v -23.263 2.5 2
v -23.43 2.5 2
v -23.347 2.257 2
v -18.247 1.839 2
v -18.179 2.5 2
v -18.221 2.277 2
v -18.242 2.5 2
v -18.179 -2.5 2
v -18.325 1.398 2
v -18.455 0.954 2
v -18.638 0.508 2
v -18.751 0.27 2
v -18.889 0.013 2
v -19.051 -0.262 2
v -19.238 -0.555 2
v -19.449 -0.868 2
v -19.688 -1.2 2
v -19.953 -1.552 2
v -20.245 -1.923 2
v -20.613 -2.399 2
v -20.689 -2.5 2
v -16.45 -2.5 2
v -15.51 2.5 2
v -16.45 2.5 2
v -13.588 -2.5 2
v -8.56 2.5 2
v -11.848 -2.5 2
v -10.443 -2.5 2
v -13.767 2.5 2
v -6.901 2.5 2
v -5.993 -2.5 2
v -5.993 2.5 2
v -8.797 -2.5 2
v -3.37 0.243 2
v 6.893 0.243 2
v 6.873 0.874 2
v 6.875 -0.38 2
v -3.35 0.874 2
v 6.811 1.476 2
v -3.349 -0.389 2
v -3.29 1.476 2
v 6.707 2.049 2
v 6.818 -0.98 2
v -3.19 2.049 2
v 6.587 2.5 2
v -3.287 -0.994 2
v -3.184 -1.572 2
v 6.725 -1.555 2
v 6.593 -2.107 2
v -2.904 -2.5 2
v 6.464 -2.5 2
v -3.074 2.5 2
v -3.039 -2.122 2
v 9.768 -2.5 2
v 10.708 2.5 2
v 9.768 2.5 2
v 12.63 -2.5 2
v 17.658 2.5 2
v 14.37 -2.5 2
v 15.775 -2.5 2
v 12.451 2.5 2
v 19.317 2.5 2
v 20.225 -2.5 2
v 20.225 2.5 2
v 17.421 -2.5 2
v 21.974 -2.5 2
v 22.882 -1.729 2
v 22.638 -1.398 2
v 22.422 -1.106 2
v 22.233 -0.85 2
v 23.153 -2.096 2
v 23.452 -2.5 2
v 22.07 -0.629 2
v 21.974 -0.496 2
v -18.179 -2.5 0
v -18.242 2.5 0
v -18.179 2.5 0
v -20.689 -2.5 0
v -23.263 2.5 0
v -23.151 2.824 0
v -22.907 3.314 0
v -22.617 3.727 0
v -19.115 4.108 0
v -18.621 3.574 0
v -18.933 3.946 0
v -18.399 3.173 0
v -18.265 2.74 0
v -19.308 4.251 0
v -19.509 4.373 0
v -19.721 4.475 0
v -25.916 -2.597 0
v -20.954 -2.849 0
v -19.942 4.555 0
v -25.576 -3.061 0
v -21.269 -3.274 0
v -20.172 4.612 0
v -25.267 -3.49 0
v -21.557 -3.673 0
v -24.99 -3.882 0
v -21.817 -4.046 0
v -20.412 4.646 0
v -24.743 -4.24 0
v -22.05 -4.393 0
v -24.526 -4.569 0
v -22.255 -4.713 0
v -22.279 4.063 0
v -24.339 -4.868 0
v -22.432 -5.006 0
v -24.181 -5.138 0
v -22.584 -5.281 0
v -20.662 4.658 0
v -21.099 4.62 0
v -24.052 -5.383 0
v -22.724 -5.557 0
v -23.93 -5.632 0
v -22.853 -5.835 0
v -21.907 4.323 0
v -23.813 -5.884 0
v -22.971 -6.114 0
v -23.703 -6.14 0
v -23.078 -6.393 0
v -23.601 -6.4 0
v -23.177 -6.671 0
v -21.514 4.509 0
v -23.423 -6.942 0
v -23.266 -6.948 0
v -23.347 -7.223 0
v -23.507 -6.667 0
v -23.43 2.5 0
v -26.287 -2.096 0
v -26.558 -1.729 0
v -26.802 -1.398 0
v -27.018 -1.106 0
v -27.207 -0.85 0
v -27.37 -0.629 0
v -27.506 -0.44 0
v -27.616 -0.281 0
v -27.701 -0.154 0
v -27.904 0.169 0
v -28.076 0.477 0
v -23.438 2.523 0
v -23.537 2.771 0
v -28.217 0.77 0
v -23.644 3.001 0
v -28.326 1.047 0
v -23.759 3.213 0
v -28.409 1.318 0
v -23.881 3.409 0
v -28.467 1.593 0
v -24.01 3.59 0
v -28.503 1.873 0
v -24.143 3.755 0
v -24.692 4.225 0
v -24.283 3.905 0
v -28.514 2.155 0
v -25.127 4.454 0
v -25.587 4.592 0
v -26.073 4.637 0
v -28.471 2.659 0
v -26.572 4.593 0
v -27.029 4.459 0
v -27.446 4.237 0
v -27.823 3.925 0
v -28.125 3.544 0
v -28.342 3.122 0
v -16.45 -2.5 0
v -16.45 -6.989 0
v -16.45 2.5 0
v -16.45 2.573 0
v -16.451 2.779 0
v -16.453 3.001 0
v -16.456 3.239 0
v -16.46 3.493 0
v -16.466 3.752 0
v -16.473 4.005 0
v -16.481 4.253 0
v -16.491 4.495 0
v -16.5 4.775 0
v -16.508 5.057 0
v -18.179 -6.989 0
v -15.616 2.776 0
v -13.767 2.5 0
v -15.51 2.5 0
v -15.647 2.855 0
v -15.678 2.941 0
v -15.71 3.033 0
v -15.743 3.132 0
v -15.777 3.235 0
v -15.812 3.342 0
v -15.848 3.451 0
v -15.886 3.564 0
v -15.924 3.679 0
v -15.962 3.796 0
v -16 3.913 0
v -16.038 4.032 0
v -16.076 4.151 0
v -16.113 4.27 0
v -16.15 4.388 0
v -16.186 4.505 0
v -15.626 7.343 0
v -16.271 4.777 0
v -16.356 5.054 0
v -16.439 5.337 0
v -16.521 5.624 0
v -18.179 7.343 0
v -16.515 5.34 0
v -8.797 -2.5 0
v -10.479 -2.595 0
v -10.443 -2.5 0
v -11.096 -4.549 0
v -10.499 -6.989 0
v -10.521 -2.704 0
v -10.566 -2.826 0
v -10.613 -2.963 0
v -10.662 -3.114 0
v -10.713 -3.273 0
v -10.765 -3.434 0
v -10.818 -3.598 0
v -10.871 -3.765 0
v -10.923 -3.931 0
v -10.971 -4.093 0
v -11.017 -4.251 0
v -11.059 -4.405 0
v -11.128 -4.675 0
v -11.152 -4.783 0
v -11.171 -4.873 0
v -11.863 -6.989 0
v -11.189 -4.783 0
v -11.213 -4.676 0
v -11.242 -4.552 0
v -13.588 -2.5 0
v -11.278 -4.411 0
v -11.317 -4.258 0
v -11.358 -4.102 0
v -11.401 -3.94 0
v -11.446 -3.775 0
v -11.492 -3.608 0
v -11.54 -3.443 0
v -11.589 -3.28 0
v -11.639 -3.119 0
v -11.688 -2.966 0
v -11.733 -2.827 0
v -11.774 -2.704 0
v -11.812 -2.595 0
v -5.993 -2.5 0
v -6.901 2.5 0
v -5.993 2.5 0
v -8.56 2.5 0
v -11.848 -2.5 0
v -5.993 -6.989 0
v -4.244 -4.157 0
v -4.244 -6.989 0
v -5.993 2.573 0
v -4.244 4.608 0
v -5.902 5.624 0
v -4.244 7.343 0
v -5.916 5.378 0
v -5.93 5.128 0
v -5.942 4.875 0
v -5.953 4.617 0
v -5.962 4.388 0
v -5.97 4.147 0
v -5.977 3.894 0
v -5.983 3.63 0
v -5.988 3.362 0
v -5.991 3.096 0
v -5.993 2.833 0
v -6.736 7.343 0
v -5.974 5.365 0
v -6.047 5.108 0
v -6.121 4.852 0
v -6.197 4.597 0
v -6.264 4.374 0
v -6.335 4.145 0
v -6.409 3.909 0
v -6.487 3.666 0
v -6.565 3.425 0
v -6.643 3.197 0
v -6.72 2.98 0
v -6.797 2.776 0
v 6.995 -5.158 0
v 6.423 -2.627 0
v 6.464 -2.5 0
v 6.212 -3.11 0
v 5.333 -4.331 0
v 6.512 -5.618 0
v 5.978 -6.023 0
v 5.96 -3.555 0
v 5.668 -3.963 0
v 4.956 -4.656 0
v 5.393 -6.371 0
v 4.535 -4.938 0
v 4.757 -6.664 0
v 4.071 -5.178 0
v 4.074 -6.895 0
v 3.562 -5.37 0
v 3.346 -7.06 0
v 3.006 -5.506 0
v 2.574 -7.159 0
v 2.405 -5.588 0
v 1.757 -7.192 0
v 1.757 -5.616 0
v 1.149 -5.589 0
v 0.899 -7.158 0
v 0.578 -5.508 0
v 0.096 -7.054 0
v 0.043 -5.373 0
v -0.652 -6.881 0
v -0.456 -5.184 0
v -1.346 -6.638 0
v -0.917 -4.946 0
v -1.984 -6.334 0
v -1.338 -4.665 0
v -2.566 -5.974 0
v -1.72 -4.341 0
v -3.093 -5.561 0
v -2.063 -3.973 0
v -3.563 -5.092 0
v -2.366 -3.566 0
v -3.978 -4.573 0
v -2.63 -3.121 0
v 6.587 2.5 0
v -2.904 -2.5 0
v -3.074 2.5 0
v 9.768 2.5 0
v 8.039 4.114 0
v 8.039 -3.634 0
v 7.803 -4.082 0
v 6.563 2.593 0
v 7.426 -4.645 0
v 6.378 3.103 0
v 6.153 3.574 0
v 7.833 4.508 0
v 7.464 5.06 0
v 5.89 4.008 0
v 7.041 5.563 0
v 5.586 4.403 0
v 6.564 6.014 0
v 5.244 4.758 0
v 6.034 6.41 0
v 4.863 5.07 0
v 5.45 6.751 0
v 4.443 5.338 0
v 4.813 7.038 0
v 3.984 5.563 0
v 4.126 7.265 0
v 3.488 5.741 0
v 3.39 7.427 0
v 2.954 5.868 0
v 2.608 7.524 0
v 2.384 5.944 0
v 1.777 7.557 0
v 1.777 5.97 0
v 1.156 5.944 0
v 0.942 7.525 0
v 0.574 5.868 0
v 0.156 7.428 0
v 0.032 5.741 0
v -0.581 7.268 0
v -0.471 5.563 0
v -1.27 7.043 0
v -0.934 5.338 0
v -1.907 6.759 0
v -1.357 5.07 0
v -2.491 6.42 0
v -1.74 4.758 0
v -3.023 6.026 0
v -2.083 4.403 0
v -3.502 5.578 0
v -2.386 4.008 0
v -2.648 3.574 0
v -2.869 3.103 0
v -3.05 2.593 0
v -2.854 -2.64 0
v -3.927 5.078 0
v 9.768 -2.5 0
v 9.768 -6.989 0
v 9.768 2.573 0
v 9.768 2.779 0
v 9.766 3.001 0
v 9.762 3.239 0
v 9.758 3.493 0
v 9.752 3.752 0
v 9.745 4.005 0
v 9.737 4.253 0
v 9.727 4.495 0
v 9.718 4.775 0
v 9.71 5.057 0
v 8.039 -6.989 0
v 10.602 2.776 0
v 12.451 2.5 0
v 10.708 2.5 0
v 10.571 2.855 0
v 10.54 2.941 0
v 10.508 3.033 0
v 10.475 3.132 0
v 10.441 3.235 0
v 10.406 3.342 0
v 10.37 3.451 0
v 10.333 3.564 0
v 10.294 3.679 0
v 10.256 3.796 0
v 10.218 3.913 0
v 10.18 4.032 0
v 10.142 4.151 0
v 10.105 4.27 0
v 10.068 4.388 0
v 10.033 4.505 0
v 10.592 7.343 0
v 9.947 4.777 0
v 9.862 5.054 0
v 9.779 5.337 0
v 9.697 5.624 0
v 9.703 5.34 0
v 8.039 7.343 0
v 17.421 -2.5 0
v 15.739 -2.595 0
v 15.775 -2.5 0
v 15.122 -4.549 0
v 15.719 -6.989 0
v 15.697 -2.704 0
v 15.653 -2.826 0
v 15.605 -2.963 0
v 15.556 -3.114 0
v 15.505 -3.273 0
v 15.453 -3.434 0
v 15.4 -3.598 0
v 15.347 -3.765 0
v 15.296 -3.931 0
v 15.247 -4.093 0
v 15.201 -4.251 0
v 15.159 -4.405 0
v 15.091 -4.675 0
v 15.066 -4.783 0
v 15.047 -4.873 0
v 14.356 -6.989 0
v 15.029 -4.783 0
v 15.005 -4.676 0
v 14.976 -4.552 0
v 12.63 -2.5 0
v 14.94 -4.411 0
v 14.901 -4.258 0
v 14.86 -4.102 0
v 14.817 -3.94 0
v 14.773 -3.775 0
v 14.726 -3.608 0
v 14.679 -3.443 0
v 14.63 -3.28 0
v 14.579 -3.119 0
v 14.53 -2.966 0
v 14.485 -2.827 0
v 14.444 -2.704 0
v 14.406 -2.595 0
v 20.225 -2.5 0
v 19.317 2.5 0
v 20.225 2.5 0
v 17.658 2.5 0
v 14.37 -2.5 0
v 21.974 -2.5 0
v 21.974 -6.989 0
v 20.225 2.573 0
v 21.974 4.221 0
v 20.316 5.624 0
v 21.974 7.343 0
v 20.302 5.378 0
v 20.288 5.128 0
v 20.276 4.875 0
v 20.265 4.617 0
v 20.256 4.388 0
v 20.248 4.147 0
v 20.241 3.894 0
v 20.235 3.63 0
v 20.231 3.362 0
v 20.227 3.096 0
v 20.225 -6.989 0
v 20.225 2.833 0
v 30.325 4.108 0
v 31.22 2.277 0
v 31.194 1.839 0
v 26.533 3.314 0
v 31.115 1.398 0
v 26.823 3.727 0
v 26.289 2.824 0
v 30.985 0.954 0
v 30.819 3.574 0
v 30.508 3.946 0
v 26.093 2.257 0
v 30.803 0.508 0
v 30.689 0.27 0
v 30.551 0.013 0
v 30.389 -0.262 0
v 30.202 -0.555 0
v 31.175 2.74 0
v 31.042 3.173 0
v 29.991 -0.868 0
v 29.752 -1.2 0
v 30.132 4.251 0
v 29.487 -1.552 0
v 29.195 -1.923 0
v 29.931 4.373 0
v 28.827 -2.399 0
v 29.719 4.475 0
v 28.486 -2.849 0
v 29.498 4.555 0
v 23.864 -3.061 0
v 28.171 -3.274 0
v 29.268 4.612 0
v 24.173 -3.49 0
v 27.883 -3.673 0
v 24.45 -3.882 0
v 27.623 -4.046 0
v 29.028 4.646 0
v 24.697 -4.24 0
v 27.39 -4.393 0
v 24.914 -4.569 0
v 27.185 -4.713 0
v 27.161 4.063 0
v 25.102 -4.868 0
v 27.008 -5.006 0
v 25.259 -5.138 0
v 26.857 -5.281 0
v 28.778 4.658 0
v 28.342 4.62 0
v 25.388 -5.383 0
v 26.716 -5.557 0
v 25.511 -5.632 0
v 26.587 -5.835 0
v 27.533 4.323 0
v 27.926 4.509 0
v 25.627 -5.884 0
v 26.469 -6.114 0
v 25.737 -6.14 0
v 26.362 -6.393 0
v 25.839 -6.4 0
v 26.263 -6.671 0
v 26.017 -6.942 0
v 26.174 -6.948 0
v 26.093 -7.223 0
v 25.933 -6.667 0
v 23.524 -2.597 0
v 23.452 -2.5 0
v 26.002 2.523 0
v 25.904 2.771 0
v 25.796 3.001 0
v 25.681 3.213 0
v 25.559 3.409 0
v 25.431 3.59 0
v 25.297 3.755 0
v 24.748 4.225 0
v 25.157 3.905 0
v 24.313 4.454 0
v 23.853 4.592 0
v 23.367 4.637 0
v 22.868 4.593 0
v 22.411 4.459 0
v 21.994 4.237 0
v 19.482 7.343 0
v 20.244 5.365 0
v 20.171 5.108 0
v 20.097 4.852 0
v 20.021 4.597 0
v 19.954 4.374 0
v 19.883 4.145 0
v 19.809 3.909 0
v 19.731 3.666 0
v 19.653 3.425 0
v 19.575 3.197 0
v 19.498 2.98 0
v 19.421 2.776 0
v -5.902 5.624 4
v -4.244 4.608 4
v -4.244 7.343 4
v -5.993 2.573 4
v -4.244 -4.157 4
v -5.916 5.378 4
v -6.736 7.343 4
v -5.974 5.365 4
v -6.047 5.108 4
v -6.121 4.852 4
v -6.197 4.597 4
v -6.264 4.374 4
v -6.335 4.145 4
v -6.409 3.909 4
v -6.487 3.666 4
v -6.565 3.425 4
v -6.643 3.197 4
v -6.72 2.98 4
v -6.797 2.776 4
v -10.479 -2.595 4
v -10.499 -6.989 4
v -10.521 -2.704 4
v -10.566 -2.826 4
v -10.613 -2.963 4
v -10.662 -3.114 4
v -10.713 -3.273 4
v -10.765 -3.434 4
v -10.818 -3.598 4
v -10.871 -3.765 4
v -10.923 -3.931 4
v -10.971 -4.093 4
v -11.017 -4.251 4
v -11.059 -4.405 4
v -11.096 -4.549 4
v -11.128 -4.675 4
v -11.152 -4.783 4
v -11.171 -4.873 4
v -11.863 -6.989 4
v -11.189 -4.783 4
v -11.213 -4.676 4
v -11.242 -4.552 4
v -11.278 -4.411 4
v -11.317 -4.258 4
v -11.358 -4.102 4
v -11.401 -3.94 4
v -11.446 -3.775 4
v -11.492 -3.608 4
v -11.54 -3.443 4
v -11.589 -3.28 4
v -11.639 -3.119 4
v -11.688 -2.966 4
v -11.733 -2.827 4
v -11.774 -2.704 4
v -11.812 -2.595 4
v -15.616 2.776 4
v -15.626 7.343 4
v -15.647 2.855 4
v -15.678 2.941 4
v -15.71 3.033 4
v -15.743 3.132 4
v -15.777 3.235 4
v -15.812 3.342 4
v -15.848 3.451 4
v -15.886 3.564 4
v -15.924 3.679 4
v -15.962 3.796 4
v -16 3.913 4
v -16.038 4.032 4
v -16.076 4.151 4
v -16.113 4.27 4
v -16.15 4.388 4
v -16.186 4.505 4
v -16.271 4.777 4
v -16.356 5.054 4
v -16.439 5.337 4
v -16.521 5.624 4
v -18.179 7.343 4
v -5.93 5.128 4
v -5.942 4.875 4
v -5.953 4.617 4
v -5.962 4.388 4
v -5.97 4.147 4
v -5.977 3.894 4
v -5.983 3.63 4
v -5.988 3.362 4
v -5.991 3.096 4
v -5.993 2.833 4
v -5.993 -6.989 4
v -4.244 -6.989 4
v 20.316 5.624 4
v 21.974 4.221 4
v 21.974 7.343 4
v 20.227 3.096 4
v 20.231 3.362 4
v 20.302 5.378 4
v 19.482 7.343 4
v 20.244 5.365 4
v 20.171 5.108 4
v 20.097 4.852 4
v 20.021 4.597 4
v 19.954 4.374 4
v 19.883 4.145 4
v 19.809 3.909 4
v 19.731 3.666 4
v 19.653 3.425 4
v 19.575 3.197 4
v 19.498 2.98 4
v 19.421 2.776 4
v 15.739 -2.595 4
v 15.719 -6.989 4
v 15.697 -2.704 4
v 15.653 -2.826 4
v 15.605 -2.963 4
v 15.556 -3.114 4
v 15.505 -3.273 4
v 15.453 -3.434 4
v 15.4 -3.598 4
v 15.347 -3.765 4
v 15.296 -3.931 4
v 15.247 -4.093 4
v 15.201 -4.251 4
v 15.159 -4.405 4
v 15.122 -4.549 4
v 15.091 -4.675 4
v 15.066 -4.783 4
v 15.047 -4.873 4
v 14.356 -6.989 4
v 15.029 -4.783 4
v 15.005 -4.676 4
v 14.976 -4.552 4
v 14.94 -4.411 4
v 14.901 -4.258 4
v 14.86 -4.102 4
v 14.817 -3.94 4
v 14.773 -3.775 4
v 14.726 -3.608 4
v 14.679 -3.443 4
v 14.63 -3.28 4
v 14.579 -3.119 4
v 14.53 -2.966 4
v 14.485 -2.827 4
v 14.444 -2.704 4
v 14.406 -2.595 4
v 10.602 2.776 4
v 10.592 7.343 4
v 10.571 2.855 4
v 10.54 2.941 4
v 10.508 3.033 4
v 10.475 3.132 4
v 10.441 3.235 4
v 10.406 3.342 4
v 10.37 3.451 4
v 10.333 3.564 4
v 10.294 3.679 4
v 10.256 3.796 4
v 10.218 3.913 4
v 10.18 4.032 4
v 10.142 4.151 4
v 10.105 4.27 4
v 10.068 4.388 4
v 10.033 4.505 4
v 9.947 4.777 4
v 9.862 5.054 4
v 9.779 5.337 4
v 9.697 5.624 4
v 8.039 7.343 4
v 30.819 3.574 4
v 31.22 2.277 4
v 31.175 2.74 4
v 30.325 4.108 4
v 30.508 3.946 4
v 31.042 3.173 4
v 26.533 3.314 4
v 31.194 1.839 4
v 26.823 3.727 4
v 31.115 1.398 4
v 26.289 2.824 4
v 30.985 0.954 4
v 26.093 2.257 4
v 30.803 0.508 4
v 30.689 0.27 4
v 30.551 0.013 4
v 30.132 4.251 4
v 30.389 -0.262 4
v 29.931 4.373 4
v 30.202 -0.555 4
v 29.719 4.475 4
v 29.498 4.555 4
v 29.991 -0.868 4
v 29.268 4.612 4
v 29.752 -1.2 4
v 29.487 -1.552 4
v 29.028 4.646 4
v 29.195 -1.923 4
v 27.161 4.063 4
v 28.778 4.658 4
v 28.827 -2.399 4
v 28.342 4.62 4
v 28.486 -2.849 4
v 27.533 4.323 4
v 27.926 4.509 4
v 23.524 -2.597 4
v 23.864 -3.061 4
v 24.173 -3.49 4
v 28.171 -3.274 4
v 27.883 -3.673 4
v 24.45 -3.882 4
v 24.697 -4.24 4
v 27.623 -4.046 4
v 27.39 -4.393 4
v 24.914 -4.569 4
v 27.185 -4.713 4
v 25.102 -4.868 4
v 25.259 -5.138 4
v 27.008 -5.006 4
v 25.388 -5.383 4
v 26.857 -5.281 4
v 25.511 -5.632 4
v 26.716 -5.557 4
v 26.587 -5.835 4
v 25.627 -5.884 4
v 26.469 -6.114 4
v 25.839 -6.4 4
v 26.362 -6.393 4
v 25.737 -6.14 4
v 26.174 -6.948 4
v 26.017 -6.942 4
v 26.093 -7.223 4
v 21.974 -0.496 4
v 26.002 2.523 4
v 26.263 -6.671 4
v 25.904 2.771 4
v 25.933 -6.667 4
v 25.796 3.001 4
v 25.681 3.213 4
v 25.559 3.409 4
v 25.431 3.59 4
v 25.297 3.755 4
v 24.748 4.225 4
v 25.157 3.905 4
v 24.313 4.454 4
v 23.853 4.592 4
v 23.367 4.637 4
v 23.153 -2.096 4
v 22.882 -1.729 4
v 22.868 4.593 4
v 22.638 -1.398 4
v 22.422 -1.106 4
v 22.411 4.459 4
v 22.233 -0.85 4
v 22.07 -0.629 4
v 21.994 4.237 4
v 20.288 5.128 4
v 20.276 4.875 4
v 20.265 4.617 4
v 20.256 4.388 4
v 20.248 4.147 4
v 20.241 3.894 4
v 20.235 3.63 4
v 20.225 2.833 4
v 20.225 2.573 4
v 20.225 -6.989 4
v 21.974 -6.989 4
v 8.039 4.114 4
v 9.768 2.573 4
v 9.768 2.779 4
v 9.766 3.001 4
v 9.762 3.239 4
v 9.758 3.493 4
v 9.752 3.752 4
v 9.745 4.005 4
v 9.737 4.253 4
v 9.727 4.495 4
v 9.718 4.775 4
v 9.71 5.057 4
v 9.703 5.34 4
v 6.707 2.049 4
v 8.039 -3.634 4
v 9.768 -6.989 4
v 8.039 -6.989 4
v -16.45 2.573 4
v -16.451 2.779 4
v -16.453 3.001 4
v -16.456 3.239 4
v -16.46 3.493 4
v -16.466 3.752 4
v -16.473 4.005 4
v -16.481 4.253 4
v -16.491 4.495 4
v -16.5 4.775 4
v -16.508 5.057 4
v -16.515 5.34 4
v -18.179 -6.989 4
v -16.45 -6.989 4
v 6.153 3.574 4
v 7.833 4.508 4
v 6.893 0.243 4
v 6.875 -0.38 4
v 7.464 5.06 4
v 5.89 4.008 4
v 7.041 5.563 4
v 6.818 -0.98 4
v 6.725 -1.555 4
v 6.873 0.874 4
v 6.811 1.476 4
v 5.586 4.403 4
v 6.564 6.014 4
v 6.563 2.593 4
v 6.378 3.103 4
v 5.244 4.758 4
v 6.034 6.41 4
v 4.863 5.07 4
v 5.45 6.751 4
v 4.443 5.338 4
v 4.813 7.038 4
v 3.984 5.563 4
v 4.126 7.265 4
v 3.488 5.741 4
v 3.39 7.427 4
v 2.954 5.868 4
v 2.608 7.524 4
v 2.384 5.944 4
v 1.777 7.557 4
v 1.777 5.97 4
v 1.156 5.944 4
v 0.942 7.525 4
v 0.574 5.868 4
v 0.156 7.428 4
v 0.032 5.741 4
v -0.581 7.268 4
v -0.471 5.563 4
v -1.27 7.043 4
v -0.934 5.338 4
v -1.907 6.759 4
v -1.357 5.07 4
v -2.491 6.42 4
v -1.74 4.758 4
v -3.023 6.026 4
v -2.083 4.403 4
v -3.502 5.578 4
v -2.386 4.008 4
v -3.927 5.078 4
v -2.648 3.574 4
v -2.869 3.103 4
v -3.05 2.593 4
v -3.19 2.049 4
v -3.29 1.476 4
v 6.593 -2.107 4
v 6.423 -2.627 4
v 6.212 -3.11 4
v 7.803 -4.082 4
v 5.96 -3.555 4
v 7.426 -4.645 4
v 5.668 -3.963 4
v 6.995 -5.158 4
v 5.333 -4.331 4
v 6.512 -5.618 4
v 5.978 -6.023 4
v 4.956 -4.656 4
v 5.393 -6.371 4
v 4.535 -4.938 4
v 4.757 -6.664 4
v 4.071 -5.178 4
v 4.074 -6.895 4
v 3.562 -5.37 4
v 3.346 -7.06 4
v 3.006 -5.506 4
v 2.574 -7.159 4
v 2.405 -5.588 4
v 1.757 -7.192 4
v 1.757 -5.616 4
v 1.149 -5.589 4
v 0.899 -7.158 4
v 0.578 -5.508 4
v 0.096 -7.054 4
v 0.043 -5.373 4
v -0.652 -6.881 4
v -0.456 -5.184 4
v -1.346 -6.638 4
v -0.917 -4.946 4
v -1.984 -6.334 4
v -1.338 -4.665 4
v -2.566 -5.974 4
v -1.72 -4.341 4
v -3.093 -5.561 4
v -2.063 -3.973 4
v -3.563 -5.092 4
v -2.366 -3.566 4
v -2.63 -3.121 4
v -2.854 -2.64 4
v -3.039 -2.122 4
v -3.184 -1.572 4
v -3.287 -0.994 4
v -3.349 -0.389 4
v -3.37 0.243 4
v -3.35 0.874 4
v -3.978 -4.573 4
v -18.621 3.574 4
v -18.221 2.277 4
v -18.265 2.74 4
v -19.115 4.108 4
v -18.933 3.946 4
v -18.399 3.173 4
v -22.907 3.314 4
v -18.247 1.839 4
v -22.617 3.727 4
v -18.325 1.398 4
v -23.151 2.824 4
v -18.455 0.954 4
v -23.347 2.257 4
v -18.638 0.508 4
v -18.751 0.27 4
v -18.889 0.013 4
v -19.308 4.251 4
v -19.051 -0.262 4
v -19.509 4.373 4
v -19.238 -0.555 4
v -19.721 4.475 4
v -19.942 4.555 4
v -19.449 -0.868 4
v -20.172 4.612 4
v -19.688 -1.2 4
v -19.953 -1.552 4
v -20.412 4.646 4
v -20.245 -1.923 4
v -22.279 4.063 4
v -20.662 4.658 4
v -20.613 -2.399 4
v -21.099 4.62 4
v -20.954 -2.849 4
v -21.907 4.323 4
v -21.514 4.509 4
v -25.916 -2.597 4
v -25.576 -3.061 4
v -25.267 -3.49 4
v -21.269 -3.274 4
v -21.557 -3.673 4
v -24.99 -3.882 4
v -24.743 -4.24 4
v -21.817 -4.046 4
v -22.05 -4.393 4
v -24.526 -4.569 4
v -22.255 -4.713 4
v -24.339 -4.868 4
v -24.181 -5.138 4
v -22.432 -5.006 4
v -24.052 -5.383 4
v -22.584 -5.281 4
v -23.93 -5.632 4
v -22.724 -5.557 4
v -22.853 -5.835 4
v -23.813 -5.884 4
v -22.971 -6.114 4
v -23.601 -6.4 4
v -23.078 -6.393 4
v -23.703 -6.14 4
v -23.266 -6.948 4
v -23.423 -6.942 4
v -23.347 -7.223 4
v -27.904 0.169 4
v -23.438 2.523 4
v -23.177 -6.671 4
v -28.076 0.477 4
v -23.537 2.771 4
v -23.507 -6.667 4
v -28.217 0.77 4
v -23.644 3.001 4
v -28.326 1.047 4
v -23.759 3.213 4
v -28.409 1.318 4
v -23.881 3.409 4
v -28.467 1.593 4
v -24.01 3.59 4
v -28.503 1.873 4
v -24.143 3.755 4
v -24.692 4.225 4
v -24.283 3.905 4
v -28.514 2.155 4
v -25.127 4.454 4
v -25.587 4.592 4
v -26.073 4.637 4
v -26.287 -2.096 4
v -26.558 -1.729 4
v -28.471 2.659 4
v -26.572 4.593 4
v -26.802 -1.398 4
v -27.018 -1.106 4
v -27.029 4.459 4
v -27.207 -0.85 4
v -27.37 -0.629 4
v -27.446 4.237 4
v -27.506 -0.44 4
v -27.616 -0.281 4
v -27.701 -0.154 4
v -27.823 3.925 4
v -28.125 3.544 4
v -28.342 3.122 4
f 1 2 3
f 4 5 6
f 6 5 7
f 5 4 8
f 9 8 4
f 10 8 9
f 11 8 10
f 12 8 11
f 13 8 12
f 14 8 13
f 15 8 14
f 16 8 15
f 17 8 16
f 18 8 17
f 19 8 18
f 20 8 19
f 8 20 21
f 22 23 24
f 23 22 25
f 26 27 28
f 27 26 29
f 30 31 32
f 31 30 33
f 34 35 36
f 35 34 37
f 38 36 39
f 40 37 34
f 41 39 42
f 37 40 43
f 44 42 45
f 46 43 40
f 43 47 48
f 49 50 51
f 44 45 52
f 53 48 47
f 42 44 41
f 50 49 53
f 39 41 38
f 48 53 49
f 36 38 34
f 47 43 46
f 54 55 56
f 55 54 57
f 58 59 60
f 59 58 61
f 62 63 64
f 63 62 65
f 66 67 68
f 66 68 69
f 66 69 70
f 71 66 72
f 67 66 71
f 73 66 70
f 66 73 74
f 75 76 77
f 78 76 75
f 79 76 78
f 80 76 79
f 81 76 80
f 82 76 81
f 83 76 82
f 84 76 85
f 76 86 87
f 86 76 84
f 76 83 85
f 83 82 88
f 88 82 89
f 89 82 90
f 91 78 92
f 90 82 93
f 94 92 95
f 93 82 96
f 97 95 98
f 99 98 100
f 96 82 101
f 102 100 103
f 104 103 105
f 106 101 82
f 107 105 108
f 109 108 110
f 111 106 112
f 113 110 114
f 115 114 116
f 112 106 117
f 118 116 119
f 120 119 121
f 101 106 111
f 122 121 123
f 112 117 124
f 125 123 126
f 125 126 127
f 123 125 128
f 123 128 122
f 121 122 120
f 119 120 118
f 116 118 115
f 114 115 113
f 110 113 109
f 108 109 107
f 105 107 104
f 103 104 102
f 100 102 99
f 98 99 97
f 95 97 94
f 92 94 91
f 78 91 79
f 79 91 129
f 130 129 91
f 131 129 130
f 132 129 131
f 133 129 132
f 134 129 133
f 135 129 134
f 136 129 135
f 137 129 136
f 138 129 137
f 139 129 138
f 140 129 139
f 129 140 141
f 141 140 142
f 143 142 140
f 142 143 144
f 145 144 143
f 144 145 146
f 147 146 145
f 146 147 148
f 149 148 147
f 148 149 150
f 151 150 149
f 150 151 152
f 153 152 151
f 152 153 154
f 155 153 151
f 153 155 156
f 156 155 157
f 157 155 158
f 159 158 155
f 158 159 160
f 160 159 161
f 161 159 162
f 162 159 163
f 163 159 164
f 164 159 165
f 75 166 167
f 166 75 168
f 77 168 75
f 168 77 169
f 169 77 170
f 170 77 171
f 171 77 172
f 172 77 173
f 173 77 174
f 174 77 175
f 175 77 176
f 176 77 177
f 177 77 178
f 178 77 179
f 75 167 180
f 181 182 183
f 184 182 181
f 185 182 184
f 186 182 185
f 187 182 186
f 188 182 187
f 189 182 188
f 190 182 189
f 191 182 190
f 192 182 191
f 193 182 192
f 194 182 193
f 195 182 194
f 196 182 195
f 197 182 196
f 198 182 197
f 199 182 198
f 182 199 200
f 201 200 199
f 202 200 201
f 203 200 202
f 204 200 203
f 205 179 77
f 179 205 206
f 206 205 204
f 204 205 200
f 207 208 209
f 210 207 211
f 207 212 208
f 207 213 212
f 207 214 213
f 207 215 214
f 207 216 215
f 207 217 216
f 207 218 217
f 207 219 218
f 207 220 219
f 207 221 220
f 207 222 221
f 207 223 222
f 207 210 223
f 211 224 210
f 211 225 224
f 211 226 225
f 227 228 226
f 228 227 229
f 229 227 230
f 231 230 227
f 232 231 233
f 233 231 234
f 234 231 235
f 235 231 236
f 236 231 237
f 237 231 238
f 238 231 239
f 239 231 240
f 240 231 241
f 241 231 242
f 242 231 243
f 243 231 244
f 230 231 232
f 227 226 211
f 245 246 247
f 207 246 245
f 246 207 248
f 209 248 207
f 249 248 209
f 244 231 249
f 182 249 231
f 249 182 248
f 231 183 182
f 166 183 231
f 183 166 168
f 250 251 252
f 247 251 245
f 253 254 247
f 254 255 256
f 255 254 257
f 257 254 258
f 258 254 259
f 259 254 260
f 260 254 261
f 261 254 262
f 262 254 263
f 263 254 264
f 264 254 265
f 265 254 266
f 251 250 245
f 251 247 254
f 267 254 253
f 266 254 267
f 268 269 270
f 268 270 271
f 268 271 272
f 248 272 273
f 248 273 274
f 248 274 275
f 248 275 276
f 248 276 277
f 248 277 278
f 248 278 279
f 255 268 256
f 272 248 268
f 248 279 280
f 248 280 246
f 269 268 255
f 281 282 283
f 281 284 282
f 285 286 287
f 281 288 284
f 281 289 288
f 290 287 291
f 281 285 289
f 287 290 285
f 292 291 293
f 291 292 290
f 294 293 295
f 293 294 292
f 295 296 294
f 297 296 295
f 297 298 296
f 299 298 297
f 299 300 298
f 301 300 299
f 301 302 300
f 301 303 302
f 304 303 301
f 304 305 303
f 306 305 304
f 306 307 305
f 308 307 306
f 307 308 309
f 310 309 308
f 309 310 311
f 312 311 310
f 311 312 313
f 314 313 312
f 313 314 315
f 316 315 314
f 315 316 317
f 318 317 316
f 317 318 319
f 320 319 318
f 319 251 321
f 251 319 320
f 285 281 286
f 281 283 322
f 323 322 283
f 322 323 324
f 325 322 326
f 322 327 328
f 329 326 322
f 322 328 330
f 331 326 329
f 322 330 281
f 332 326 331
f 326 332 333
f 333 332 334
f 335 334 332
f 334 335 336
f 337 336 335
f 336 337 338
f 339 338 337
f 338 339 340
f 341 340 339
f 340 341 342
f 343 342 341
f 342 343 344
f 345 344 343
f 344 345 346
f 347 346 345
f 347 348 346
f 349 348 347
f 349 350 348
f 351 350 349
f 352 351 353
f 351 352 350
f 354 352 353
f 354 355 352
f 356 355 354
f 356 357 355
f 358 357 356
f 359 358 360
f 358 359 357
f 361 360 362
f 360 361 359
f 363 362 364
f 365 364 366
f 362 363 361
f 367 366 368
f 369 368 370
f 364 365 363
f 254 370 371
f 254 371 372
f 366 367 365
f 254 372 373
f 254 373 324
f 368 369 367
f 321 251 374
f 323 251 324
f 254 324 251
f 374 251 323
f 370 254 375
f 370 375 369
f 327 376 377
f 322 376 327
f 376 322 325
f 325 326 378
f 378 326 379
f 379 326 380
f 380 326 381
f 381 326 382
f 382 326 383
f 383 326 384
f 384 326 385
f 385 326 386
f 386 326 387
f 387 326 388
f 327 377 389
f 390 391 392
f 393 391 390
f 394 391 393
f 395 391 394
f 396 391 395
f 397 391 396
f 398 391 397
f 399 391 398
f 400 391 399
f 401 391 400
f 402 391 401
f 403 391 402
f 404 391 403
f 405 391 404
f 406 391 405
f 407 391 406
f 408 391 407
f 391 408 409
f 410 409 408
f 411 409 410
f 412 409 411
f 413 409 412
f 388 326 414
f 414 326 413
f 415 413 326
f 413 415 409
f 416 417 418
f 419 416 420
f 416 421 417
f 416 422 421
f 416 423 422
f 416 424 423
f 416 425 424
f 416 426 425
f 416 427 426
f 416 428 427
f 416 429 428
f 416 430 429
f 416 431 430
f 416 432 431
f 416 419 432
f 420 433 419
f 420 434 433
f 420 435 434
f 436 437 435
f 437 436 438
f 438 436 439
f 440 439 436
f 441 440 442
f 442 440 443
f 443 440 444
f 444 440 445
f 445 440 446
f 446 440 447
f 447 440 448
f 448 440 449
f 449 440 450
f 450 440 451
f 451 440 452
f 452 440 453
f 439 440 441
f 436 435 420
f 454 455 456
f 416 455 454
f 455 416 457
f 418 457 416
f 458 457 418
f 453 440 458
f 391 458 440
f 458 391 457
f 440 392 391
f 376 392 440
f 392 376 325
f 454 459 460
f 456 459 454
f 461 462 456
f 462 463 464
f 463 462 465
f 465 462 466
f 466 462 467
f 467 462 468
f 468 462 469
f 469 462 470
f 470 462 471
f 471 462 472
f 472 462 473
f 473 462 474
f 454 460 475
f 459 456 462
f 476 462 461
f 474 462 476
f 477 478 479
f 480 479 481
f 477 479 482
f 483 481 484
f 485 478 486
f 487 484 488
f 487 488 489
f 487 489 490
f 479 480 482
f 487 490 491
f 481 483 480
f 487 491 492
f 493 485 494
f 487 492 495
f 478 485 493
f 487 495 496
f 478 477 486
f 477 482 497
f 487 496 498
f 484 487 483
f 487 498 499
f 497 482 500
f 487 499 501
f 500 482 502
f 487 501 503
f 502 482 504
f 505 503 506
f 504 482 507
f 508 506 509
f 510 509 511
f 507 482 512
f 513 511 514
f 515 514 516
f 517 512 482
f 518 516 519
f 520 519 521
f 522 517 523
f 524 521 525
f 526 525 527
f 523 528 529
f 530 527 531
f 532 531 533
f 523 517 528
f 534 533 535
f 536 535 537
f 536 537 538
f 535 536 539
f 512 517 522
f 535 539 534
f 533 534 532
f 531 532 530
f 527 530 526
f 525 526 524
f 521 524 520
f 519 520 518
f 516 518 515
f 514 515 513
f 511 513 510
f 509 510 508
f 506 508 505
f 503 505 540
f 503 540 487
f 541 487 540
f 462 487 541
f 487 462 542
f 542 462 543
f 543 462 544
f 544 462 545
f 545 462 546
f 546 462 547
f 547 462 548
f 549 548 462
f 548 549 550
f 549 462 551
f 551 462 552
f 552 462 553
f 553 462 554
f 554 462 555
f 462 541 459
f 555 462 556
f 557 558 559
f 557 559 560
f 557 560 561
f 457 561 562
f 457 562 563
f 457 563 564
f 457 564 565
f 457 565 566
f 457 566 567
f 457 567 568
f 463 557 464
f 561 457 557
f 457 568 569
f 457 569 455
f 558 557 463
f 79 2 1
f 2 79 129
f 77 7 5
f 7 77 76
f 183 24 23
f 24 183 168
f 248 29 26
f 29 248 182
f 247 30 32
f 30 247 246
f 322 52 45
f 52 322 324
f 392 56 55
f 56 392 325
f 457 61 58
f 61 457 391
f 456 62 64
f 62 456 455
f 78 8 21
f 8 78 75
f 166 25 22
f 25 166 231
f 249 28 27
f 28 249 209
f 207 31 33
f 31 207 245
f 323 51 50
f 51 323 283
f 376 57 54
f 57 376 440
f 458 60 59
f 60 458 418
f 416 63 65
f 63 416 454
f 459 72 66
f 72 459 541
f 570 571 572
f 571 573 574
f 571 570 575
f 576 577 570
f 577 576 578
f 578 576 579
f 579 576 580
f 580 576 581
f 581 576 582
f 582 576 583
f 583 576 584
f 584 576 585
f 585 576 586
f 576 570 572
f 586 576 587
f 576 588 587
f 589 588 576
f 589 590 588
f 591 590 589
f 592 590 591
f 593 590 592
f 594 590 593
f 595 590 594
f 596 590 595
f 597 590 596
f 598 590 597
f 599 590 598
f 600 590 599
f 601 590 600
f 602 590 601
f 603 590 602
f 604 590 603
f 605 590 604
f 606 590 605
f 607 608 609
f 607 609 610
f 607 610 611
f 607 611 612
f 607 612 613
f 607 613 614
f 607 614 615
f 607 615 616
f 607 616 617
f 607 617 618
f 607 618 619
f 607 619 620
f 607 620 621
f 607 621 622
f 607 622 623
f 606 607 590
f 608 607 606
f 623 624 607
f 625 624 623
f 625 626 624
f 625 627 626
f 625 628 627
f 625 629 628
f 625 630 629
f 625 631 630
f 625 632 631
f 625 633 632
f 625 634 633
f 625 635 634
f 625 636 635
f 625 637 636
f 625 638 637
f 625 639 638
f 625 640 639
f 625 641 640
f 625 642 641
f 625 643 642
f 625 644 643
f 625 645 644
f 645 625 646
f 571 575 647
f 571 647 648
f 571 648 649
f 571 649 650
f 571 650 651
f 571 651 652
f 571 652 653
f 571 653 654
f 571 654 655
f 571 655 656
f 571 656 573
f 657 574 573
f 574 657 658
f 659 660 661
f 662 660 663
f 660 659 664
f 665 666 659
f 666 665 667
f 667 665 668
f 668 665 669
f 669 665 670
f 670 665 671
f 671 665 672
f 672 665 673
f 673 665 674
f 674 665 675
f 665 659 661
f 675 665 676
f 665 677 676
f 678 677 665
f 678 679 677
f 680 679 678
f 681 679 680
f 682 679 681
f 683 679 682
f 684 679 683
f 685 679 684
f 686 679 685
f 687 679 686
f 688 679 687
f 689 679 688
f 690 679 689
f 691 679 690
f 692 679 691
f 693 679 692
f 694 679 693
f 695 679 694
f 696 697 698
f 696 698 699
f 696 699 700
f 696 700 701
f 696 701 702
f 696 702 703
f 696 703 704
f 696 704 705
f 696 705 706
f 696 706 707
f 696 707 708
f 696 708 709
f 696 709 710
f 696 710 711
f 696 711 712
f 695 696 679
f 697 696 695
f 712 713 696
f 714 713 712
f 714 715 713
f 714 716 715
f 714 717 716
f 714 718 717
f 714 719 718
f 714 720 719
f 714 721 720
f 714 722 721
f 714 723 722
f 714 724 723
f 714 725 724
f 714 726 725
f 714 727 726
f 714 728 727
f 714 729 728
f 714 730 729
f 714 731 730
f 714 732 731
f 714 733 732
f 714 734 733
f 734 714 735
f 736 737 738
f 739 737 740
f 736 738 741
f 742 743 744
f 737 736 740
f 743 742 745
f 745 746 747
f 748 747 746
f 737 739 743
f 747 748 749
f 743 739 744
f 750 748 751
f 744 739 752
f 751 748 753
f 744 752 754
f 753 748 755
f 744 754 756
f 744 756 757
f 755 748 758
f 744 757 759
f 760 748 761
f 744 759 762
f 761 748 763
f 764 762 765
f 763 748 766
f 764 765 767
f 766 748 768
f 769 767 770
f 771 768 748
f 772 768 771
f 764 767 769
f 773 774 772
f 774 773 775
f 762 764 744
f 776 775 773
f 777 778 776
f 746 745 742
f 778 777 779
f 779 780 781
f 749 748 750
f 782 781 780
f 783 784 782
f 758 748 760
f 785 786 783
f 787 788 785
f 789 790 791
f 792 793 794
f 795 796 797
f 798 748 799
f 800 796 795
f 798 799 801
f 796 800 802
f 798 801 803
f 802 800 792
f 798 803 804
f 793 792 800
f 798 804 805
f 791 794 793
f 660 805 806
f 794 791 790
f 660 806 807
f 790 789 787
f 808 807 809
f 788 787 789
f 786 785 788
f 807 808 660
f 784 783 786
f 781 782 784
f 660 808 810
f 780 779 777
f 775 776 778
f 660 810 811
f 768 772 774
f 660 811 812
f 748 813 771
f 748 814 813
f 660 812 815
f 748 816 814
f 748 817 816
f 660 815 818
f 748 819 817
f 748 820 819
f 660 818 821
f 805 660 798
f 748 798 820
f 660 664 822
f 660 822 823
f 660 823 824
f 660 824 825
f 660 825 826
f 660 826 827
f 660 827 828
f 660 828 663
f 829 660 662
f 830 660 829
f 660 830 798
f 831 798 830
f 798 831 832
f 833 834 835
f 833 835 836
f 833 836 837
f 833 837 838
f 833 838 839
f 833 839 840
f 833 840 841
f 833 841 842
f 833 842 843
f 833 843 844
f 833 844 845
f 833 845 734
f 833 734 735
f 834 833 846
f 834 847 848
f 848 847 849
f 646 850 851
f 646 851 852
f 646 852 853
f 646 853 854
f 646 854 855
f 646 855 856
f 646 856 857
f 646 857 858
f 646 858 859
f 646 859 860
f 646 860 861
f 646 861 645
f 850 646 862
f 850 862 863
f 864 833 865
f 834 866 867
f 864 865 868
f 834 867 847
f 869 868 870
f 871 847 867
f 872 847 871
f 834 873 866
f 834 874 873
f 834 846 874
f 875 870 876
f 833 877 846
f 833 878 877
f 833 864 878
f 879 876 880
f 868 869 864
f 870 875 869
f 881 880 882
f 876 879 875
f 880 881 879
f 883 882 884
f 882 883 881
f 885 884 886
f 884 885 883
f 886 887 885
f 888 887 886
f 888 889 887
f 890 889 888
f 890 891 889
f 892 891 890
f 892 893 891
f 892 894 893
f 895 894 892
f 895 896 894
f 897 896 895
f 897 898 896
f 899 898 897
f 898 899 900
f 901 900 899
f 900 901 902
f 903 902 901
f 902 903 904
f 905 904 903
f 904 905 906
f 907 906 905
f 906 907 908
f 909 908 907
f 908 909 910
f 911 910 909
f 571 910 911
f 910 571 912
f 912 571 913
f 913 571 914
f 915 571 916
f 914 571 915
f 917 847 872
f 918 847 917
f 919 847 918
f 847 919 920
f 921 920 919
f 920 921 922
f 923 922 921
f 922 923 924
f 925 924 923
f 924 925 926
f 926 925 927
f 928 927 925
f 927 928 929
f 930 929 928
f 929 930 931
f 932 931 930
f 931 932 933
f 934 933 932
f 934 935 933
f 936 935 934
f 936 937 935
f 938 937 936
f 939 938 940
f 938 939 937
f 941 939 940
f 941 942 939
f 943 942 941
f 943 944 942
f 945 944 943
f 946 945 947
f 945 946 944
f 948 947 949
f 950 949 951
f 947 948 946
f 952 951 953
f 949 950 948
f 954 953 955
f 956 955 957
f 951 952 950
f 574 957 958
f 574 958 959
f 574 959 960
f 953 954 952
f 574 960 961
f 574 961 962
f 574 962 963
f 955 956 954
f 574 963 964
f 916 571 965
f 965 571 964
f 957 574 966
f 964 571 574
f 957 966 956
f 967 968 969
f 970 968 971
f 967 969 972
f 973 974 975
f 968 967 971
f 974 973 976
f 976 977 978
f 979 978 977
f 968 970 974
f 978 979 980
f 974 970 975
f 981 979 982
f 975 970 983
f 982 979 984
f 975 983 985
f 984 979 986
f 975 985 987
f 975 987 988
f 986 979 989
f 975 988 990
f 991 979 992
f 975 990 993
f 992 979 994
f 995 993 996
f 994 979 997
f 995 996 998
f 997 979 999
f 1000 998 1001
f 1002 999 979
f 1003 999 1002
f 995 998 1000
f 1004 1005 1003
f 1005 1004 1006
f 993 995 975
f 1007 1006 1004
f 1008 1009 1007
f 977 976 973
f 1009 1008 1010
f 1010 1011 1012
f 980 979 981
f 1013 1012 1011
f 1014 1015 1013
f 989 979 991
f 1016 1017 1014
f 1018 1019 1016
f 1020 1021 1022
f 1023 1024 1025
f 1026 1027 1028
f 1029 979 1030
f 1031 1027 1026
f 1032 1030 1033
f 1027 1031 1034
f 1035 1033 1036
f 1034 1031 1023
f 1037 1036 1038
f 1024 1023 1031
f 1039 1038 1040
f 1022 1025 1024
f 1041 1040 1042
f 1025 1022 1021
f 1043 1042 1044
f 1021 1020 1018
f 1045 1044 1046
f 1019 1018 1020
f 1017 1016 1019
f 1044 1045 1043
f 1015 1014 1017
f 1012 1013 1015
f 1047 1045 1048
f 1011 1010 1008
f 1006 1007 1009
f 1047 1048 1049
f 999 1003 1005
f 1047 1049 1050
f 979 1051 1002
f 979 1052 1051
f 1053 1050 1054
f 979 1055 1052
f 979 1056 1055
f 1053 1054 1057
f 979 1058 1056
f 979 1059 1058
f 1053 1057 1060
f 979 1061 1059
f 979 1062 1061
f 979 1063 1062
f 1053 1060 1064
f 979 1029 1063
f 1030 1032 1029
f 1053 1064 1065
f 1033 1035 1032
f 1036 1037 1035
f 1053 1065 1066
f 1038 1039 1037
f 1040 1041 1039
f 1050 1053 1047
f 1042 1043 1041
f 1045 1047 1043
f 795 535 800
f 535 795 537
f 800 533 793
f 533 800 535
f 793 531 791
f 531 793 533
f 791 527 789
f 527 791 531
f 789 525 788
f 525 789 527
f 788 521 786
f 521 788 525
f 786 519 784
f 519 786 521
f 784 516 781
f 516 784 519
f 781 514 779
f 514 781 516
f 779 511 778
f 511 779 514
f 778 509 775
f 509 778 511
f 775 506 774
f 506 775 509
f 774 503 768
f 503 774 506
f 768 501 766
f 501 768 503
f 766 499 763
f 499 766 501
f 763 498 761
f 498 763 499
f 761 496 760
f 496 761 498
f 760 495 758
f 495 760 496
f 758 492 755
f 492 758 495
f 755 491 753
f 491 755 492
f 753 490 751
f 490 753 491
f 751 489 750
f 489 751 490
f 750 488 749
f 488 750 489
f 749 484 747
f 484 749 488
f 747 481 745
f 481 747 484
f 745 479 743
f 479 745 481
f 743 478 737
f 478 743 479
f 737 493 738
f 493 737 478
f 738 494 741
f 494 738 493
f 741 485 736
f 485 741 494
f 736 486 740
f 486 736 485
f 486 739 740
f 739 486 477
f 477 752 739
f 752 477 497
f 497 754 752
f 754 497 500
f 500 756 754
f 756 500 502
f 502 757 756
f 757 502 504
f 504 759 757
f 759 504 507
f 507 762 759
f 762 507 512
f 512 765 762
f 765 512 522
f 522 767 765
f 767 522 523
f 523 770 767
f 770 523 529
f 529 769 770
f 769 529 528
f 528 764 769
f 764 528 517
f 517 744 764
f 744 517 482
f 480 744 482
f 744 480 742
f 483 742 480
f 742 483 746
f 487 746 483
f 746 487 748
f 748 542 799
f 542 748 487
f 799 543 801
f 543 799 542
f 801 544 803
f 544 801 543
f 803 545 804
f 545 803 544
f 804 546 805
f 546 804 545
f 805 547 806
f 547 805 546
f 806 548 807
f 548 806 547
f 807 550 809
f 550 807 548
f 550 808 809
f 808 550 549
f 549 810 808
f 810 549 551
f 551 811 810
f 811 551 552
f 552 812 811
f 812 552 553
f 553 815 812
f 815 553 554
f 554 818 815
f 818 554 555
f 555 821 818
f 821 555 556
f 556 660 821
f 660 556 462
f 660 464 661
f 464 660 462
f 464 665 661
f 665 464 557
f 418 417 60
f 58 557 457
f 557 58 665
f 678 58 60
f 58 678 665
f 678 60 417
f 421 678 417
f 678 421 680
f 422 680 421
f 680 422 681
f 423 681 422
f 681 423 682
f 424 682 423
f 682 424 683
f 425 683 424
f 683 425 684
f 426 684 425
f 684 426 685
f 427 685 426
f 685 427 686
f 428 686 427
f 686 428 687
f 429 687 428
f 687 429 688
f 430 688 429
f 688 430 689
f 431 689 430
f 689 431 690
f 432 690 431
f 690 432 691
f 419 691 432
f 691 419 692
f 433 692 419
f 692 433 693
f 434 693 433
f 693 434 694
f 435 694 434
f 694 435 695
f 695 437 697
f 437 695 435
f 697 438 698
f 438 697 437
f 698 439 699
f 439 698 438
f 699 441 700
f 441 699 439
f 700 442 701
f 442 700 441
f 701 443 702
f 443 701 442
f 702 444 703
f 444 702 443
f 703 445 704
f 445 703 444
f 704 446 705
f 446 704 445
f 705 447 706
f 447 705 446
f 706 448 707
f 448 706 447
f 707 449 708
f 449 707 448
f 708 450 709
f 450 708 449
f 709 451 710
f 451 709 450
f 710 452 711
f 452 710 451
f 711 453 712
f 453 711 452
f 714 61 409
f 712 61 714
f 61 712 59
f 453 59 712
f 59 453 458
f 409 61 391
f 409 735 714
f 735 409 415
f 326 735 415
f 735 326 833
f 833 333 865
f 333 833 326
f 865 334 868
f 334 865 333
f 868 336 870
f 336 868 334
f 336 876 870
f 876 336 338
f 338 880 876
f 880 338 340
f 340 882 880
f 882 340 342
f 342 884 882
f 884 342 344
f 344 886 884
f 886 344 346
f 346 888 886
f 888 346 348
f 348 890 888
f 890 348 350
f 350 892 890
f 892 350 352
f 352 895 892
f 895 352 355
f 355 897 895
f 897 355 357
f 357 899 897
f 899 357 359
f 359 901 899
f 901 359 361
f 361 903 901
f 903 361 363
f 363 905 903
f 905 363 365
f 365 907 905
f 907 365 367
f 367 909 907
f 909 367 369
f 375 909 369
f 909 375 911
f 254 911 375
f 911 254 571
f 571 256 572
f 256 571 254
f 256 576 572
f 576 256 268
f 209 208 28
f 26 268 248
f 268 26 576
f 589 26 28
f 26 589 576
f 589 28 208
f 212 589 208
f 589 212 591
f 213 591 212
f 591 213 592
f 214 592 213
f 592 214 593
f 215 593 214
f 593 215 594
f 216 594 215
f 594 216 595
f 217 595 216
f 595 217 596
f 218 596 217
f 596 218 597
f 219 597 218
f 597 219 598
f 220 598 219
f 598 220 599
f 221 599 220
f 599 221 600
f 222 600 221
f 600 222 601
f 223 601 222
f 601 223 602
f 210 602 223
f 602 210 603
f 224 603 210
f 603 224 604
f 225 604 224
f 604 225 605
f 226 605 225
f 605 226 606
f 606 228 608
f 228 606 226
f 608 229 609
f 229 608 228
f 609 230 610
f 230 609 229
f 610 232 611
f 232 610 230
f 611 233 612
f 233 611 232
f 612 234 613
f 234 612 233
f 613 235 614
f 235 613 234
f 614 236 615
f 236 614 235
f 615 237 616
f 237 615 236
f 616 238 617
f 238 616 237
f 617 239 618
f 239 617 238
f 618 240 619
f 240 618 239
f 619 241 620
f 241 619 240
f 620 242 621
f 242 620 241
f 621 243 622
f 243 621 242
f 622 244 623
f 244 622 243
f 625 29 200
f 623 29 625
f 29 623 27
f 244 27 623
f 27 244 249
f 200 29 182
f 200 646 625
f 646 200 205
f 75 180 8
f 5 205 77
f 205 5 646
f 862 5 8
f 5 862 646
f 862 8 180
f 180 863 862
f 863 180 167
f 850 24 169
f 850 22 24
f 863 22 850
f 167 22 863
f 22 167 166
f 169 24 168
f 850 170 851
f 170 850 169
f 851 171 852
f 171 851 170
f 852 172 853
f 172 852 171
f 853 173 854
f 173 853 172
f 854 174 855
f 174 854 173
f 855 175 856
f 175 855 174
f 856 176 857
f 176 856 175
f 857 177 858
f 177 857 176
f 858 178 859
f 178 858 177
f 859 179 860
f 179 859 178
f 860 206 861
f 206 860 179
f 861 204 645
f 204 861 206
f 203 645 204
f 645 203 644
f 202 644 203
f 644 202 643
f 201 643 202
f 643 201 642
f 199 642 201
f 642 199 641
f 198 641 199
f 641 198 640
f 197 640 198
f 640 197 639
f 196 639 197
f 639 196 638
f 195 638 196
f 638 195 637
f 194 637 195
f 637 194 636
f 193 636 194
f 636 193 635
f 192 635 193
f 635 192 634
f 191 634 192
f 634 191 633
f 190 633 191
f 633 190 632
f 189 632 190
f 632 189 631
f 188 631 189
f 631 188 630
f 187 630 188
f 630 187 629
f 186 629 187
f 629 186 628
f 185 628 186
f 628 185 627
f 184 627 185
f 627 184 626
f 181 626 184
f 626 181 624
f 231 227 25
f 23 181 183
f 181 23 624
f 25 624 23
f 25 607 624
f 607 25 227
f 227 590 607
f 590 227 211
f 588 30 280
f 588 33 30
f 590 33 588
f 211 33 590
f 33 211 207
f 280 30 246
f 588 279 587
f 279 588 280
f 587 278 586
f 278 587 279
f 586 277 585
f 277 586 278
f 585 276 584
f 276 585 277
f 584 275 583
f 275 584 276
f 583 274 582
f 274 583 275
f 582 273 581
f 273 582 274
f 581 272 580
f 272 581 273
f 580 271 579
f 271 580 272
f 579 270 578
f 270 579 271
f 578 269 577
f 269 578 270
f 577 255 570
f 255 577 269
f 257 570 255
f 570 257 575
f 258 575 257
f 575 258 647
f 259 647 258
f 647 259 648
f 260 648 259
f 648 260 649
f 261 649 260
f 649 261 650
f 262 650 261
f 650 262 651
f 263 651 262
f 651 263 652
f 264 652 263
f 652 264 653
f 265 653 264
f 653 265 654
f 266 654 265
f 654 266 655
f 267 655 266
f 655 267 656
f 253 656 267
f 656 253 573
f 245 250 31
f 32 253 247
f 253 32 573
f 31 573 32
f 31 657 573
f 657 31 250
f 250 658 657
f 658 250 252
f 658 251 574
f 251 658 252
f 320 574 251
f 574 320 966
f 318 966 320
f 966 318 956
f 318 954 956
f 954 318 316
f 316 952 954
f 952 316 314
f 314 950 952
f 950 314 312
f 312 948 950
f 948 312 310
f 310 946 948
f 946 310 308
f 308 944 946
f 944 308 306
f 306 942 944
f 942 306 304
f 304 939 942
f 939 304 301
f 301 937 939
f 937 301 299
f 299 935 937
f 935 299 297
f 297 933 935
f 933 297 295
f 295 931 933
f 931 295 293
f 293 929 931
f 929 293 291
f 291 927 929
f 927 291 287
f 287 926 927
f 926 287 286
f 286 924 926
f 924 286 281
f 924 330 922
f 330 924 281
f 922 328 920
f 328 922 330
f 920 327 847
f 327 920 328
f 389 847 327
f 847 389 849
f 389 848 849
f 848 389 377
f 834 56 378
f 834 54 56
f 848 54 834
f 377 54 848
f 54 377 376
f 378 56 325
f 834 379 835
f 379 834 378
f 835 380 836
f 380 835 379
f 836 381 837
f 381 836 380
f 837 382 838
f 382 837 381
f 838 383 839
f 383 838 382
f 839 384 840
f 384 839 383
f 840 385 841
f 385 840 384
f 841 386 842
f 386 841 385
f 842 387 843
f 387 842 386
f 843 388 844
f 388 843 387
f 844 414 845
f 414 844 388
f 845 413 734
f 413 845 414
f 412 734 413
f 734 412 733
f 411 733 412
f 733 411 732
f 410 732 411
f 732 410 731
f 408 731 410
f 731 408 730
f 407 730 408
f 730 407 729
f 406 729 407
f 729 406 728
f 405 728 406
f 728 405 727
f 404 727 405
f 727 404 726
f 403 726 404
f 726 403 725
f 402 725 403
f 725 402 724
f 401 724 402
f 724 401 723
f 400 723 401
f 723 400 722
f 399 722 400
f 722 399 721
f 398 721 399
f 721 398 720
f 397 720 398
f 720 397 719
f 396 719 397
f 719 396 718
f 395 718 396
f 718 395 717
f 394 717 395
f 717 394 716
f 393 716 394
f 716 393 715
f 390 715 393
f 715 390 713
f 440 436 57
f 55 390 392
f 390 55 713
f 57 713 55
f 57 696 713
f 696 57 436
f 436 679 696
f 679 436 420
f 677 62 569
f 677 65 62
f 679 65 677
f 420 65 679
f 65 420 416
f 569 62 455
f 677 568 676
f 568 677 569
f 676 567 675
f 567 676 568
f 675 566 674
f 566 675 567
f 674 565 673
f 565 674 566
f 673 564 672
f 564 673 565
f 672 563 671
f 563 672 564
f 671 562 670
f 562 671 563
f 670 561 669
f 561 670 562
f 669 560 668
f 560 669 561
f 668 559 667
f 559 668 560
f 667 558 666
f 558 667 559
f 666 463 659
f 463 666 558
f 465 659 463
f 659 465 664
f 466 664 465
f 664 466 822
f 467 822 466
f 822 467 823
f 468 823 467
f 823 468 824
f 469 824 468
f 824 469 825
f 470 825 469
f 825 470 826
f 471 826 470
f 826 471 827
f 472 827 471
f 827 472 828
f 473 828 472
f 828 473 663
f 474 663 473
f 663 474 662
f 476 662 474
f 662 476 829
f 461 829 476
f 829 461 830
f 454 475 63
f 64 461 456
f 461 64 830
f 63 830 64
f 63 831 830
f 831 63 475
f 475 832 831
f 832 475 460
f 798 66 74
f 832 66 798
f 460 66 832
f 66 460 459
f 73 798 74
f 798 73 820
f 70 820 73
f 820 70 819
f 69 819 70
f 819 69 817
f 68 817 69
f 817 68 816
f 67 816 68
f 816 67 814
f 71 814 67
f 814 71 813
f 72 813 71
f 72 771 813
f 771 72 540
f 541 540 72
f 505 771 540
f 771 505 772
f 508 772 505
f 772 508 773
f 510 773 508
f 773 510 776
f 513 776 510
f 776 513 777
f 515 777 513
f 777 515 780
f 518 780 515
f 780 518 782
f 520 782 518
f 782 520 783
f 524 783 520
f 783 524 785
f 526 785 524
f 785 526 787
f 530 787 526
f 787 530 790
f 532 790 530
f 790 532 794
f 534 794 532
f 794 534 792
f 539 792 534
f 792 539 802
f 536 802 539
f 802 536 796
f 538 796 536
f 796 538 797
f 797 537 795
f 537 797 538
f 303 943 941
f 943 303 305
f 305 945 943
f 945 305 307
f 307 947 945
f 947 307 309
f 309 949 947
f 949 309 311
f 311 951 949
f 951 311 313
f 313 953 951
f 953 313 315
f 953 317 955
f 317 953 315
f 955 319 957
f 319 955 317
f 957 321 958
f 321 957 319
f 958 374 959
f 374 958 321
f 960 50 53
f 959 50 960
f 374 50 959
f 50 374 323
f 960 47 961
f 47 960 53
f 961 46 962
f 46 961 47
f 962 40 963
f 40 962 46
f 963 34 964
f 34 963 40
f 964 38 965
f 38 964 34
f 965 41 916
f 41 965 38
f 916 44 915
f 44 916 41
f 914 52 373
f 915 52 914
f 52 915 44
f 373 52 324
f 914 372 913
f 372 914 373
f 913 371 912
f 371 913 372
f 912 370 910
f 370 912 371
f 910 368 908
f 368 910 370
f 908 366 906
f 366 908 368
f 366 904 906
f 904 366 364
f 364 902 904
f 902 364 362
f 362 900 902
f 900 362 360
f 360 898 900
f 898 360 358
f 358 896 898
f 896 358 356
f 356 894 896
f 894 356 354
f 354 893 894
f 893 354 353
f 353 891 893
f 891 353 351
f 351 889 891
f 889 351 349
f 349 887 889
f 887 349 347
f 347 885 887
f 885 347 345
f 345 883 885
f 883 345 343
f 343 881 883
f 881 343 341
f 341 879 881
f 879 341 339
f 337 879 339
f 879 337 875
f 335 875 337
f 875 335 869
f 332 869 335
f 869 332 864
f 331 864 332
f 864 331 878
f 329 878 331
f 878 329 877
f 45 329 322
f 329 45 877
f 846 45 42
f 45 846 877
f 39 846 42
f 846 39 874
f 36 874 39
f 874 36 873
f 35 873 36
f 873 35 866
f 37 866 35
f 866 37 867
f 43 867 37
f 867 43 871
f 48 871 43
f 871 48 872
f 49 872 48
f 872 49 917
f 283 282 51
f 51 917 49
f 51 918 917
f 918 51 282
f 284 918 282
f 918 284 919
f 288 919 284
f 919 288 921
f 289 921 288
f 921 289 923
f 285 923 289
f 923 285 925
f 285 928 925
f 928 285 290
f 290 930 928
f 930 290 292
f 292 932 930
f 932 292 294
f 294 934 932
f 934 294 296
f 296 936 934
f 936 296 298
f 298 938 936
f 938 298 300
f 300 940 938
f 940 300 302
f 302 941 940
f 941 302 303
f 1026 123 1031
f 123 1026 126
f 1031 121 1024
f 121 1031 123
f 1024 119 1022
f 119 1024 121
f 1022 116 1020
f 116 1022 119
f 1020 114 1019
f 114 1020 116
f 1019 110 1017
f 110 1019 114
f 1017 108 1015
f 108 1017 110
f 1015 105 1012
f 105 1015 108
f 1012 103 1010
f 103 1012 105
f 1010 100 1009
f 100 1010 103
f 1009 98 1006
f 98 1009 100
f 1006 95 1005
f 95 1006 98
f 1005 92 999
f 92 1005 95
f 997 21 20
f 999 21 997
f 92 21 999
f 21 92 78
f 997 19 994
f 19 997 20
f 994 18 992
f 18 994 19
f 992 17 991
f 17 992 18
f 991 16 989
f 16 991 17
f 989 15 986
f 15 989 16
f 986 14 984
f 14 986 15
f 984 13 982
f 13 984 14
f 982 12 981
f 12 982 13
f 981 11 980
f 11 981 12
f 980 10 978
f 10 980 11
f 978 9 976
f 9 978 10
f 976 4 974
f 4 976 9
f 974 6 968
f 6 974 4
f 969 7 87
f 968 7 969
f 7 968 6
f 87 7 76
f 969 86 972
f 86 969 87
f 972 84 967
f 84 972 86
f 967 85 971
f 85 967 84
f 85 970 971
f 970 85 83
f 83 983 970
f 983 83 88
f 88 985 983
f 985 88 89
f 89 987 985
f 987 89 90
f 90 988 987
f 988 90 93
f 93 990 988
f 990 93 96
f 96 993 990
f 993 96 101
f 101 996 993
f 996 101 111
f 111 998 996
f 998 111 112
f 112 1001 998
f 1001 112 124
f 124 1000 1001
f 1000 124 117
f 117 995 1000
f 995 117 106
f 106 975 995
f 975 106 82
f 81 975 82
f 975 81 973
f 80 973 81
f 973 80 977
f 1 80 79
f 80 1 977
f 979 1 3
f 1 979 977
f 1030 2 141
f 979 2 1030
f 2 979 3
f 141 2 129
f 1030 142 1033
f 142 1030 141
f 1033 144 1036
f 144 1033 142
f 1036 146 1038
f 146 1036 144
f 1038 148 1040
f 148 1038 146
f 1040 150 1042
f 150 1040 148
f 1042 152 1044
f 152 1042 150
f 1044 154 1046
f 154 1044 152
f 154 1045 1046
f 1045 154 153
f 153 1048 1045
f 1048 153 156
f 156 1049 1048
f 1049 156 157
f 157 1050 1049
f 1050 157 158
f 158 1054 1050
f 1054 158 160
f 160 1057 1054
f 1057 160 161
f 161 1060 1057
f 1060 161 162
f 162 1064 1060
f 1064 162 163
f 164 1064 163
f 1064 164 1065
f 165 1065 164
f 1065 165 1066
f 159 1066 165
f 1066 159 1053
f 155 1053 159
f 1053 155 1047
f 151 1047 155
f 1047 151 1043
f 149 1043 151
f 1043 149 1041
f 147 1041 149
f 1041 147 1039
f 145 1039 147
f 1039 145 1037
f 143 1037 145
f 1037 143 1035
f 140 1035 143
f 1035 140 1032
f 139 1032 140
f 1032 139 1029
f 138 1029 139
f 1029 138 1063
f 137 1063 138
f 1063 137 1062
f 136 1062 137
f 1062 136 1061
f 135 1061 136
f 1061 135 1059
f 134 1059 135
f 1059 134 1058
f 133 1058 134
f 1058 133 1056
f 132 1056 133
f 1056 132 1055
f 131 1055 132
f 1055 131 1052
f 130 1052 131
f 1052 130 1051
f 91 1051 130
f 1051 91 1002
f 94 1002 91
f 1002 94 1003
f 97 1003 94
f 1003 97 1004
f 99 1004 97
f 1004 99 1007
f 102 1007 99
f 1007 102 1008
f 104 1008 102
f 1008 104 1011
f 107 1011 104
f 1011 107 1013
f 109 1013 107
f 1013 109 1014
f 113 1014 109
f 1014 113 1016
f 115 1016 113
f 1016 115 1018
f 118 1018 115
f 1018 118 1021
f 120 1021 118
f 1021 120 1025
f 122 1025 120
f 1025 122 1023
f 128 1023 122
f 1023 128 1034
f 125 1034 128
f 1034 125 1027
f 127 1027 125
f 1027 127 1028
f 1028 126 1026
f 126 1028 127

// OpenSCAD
targa_Ydir=5;
targa_Xdir=50;
targa_spessore_thickness=2;
word="\u2665MOM\u2665";  //word to spinn
size_font=15;               //size of the font
spacing_text=.8;            //word letter spacing

n_word=len(word);           //calculate length

translate([0, 0, targa_spessore_thickness/2]) {
    cube([targa_Xdir,targa_Ydir,targa_spessore_thickness],true);
}

linear_extrude(height = targa_spessore_thickness+2)
text(word, size=size_font, font="Liberation Sans", halign="center", valign="center",
  spacing=spacing_text, direction="ltr", language="it");
